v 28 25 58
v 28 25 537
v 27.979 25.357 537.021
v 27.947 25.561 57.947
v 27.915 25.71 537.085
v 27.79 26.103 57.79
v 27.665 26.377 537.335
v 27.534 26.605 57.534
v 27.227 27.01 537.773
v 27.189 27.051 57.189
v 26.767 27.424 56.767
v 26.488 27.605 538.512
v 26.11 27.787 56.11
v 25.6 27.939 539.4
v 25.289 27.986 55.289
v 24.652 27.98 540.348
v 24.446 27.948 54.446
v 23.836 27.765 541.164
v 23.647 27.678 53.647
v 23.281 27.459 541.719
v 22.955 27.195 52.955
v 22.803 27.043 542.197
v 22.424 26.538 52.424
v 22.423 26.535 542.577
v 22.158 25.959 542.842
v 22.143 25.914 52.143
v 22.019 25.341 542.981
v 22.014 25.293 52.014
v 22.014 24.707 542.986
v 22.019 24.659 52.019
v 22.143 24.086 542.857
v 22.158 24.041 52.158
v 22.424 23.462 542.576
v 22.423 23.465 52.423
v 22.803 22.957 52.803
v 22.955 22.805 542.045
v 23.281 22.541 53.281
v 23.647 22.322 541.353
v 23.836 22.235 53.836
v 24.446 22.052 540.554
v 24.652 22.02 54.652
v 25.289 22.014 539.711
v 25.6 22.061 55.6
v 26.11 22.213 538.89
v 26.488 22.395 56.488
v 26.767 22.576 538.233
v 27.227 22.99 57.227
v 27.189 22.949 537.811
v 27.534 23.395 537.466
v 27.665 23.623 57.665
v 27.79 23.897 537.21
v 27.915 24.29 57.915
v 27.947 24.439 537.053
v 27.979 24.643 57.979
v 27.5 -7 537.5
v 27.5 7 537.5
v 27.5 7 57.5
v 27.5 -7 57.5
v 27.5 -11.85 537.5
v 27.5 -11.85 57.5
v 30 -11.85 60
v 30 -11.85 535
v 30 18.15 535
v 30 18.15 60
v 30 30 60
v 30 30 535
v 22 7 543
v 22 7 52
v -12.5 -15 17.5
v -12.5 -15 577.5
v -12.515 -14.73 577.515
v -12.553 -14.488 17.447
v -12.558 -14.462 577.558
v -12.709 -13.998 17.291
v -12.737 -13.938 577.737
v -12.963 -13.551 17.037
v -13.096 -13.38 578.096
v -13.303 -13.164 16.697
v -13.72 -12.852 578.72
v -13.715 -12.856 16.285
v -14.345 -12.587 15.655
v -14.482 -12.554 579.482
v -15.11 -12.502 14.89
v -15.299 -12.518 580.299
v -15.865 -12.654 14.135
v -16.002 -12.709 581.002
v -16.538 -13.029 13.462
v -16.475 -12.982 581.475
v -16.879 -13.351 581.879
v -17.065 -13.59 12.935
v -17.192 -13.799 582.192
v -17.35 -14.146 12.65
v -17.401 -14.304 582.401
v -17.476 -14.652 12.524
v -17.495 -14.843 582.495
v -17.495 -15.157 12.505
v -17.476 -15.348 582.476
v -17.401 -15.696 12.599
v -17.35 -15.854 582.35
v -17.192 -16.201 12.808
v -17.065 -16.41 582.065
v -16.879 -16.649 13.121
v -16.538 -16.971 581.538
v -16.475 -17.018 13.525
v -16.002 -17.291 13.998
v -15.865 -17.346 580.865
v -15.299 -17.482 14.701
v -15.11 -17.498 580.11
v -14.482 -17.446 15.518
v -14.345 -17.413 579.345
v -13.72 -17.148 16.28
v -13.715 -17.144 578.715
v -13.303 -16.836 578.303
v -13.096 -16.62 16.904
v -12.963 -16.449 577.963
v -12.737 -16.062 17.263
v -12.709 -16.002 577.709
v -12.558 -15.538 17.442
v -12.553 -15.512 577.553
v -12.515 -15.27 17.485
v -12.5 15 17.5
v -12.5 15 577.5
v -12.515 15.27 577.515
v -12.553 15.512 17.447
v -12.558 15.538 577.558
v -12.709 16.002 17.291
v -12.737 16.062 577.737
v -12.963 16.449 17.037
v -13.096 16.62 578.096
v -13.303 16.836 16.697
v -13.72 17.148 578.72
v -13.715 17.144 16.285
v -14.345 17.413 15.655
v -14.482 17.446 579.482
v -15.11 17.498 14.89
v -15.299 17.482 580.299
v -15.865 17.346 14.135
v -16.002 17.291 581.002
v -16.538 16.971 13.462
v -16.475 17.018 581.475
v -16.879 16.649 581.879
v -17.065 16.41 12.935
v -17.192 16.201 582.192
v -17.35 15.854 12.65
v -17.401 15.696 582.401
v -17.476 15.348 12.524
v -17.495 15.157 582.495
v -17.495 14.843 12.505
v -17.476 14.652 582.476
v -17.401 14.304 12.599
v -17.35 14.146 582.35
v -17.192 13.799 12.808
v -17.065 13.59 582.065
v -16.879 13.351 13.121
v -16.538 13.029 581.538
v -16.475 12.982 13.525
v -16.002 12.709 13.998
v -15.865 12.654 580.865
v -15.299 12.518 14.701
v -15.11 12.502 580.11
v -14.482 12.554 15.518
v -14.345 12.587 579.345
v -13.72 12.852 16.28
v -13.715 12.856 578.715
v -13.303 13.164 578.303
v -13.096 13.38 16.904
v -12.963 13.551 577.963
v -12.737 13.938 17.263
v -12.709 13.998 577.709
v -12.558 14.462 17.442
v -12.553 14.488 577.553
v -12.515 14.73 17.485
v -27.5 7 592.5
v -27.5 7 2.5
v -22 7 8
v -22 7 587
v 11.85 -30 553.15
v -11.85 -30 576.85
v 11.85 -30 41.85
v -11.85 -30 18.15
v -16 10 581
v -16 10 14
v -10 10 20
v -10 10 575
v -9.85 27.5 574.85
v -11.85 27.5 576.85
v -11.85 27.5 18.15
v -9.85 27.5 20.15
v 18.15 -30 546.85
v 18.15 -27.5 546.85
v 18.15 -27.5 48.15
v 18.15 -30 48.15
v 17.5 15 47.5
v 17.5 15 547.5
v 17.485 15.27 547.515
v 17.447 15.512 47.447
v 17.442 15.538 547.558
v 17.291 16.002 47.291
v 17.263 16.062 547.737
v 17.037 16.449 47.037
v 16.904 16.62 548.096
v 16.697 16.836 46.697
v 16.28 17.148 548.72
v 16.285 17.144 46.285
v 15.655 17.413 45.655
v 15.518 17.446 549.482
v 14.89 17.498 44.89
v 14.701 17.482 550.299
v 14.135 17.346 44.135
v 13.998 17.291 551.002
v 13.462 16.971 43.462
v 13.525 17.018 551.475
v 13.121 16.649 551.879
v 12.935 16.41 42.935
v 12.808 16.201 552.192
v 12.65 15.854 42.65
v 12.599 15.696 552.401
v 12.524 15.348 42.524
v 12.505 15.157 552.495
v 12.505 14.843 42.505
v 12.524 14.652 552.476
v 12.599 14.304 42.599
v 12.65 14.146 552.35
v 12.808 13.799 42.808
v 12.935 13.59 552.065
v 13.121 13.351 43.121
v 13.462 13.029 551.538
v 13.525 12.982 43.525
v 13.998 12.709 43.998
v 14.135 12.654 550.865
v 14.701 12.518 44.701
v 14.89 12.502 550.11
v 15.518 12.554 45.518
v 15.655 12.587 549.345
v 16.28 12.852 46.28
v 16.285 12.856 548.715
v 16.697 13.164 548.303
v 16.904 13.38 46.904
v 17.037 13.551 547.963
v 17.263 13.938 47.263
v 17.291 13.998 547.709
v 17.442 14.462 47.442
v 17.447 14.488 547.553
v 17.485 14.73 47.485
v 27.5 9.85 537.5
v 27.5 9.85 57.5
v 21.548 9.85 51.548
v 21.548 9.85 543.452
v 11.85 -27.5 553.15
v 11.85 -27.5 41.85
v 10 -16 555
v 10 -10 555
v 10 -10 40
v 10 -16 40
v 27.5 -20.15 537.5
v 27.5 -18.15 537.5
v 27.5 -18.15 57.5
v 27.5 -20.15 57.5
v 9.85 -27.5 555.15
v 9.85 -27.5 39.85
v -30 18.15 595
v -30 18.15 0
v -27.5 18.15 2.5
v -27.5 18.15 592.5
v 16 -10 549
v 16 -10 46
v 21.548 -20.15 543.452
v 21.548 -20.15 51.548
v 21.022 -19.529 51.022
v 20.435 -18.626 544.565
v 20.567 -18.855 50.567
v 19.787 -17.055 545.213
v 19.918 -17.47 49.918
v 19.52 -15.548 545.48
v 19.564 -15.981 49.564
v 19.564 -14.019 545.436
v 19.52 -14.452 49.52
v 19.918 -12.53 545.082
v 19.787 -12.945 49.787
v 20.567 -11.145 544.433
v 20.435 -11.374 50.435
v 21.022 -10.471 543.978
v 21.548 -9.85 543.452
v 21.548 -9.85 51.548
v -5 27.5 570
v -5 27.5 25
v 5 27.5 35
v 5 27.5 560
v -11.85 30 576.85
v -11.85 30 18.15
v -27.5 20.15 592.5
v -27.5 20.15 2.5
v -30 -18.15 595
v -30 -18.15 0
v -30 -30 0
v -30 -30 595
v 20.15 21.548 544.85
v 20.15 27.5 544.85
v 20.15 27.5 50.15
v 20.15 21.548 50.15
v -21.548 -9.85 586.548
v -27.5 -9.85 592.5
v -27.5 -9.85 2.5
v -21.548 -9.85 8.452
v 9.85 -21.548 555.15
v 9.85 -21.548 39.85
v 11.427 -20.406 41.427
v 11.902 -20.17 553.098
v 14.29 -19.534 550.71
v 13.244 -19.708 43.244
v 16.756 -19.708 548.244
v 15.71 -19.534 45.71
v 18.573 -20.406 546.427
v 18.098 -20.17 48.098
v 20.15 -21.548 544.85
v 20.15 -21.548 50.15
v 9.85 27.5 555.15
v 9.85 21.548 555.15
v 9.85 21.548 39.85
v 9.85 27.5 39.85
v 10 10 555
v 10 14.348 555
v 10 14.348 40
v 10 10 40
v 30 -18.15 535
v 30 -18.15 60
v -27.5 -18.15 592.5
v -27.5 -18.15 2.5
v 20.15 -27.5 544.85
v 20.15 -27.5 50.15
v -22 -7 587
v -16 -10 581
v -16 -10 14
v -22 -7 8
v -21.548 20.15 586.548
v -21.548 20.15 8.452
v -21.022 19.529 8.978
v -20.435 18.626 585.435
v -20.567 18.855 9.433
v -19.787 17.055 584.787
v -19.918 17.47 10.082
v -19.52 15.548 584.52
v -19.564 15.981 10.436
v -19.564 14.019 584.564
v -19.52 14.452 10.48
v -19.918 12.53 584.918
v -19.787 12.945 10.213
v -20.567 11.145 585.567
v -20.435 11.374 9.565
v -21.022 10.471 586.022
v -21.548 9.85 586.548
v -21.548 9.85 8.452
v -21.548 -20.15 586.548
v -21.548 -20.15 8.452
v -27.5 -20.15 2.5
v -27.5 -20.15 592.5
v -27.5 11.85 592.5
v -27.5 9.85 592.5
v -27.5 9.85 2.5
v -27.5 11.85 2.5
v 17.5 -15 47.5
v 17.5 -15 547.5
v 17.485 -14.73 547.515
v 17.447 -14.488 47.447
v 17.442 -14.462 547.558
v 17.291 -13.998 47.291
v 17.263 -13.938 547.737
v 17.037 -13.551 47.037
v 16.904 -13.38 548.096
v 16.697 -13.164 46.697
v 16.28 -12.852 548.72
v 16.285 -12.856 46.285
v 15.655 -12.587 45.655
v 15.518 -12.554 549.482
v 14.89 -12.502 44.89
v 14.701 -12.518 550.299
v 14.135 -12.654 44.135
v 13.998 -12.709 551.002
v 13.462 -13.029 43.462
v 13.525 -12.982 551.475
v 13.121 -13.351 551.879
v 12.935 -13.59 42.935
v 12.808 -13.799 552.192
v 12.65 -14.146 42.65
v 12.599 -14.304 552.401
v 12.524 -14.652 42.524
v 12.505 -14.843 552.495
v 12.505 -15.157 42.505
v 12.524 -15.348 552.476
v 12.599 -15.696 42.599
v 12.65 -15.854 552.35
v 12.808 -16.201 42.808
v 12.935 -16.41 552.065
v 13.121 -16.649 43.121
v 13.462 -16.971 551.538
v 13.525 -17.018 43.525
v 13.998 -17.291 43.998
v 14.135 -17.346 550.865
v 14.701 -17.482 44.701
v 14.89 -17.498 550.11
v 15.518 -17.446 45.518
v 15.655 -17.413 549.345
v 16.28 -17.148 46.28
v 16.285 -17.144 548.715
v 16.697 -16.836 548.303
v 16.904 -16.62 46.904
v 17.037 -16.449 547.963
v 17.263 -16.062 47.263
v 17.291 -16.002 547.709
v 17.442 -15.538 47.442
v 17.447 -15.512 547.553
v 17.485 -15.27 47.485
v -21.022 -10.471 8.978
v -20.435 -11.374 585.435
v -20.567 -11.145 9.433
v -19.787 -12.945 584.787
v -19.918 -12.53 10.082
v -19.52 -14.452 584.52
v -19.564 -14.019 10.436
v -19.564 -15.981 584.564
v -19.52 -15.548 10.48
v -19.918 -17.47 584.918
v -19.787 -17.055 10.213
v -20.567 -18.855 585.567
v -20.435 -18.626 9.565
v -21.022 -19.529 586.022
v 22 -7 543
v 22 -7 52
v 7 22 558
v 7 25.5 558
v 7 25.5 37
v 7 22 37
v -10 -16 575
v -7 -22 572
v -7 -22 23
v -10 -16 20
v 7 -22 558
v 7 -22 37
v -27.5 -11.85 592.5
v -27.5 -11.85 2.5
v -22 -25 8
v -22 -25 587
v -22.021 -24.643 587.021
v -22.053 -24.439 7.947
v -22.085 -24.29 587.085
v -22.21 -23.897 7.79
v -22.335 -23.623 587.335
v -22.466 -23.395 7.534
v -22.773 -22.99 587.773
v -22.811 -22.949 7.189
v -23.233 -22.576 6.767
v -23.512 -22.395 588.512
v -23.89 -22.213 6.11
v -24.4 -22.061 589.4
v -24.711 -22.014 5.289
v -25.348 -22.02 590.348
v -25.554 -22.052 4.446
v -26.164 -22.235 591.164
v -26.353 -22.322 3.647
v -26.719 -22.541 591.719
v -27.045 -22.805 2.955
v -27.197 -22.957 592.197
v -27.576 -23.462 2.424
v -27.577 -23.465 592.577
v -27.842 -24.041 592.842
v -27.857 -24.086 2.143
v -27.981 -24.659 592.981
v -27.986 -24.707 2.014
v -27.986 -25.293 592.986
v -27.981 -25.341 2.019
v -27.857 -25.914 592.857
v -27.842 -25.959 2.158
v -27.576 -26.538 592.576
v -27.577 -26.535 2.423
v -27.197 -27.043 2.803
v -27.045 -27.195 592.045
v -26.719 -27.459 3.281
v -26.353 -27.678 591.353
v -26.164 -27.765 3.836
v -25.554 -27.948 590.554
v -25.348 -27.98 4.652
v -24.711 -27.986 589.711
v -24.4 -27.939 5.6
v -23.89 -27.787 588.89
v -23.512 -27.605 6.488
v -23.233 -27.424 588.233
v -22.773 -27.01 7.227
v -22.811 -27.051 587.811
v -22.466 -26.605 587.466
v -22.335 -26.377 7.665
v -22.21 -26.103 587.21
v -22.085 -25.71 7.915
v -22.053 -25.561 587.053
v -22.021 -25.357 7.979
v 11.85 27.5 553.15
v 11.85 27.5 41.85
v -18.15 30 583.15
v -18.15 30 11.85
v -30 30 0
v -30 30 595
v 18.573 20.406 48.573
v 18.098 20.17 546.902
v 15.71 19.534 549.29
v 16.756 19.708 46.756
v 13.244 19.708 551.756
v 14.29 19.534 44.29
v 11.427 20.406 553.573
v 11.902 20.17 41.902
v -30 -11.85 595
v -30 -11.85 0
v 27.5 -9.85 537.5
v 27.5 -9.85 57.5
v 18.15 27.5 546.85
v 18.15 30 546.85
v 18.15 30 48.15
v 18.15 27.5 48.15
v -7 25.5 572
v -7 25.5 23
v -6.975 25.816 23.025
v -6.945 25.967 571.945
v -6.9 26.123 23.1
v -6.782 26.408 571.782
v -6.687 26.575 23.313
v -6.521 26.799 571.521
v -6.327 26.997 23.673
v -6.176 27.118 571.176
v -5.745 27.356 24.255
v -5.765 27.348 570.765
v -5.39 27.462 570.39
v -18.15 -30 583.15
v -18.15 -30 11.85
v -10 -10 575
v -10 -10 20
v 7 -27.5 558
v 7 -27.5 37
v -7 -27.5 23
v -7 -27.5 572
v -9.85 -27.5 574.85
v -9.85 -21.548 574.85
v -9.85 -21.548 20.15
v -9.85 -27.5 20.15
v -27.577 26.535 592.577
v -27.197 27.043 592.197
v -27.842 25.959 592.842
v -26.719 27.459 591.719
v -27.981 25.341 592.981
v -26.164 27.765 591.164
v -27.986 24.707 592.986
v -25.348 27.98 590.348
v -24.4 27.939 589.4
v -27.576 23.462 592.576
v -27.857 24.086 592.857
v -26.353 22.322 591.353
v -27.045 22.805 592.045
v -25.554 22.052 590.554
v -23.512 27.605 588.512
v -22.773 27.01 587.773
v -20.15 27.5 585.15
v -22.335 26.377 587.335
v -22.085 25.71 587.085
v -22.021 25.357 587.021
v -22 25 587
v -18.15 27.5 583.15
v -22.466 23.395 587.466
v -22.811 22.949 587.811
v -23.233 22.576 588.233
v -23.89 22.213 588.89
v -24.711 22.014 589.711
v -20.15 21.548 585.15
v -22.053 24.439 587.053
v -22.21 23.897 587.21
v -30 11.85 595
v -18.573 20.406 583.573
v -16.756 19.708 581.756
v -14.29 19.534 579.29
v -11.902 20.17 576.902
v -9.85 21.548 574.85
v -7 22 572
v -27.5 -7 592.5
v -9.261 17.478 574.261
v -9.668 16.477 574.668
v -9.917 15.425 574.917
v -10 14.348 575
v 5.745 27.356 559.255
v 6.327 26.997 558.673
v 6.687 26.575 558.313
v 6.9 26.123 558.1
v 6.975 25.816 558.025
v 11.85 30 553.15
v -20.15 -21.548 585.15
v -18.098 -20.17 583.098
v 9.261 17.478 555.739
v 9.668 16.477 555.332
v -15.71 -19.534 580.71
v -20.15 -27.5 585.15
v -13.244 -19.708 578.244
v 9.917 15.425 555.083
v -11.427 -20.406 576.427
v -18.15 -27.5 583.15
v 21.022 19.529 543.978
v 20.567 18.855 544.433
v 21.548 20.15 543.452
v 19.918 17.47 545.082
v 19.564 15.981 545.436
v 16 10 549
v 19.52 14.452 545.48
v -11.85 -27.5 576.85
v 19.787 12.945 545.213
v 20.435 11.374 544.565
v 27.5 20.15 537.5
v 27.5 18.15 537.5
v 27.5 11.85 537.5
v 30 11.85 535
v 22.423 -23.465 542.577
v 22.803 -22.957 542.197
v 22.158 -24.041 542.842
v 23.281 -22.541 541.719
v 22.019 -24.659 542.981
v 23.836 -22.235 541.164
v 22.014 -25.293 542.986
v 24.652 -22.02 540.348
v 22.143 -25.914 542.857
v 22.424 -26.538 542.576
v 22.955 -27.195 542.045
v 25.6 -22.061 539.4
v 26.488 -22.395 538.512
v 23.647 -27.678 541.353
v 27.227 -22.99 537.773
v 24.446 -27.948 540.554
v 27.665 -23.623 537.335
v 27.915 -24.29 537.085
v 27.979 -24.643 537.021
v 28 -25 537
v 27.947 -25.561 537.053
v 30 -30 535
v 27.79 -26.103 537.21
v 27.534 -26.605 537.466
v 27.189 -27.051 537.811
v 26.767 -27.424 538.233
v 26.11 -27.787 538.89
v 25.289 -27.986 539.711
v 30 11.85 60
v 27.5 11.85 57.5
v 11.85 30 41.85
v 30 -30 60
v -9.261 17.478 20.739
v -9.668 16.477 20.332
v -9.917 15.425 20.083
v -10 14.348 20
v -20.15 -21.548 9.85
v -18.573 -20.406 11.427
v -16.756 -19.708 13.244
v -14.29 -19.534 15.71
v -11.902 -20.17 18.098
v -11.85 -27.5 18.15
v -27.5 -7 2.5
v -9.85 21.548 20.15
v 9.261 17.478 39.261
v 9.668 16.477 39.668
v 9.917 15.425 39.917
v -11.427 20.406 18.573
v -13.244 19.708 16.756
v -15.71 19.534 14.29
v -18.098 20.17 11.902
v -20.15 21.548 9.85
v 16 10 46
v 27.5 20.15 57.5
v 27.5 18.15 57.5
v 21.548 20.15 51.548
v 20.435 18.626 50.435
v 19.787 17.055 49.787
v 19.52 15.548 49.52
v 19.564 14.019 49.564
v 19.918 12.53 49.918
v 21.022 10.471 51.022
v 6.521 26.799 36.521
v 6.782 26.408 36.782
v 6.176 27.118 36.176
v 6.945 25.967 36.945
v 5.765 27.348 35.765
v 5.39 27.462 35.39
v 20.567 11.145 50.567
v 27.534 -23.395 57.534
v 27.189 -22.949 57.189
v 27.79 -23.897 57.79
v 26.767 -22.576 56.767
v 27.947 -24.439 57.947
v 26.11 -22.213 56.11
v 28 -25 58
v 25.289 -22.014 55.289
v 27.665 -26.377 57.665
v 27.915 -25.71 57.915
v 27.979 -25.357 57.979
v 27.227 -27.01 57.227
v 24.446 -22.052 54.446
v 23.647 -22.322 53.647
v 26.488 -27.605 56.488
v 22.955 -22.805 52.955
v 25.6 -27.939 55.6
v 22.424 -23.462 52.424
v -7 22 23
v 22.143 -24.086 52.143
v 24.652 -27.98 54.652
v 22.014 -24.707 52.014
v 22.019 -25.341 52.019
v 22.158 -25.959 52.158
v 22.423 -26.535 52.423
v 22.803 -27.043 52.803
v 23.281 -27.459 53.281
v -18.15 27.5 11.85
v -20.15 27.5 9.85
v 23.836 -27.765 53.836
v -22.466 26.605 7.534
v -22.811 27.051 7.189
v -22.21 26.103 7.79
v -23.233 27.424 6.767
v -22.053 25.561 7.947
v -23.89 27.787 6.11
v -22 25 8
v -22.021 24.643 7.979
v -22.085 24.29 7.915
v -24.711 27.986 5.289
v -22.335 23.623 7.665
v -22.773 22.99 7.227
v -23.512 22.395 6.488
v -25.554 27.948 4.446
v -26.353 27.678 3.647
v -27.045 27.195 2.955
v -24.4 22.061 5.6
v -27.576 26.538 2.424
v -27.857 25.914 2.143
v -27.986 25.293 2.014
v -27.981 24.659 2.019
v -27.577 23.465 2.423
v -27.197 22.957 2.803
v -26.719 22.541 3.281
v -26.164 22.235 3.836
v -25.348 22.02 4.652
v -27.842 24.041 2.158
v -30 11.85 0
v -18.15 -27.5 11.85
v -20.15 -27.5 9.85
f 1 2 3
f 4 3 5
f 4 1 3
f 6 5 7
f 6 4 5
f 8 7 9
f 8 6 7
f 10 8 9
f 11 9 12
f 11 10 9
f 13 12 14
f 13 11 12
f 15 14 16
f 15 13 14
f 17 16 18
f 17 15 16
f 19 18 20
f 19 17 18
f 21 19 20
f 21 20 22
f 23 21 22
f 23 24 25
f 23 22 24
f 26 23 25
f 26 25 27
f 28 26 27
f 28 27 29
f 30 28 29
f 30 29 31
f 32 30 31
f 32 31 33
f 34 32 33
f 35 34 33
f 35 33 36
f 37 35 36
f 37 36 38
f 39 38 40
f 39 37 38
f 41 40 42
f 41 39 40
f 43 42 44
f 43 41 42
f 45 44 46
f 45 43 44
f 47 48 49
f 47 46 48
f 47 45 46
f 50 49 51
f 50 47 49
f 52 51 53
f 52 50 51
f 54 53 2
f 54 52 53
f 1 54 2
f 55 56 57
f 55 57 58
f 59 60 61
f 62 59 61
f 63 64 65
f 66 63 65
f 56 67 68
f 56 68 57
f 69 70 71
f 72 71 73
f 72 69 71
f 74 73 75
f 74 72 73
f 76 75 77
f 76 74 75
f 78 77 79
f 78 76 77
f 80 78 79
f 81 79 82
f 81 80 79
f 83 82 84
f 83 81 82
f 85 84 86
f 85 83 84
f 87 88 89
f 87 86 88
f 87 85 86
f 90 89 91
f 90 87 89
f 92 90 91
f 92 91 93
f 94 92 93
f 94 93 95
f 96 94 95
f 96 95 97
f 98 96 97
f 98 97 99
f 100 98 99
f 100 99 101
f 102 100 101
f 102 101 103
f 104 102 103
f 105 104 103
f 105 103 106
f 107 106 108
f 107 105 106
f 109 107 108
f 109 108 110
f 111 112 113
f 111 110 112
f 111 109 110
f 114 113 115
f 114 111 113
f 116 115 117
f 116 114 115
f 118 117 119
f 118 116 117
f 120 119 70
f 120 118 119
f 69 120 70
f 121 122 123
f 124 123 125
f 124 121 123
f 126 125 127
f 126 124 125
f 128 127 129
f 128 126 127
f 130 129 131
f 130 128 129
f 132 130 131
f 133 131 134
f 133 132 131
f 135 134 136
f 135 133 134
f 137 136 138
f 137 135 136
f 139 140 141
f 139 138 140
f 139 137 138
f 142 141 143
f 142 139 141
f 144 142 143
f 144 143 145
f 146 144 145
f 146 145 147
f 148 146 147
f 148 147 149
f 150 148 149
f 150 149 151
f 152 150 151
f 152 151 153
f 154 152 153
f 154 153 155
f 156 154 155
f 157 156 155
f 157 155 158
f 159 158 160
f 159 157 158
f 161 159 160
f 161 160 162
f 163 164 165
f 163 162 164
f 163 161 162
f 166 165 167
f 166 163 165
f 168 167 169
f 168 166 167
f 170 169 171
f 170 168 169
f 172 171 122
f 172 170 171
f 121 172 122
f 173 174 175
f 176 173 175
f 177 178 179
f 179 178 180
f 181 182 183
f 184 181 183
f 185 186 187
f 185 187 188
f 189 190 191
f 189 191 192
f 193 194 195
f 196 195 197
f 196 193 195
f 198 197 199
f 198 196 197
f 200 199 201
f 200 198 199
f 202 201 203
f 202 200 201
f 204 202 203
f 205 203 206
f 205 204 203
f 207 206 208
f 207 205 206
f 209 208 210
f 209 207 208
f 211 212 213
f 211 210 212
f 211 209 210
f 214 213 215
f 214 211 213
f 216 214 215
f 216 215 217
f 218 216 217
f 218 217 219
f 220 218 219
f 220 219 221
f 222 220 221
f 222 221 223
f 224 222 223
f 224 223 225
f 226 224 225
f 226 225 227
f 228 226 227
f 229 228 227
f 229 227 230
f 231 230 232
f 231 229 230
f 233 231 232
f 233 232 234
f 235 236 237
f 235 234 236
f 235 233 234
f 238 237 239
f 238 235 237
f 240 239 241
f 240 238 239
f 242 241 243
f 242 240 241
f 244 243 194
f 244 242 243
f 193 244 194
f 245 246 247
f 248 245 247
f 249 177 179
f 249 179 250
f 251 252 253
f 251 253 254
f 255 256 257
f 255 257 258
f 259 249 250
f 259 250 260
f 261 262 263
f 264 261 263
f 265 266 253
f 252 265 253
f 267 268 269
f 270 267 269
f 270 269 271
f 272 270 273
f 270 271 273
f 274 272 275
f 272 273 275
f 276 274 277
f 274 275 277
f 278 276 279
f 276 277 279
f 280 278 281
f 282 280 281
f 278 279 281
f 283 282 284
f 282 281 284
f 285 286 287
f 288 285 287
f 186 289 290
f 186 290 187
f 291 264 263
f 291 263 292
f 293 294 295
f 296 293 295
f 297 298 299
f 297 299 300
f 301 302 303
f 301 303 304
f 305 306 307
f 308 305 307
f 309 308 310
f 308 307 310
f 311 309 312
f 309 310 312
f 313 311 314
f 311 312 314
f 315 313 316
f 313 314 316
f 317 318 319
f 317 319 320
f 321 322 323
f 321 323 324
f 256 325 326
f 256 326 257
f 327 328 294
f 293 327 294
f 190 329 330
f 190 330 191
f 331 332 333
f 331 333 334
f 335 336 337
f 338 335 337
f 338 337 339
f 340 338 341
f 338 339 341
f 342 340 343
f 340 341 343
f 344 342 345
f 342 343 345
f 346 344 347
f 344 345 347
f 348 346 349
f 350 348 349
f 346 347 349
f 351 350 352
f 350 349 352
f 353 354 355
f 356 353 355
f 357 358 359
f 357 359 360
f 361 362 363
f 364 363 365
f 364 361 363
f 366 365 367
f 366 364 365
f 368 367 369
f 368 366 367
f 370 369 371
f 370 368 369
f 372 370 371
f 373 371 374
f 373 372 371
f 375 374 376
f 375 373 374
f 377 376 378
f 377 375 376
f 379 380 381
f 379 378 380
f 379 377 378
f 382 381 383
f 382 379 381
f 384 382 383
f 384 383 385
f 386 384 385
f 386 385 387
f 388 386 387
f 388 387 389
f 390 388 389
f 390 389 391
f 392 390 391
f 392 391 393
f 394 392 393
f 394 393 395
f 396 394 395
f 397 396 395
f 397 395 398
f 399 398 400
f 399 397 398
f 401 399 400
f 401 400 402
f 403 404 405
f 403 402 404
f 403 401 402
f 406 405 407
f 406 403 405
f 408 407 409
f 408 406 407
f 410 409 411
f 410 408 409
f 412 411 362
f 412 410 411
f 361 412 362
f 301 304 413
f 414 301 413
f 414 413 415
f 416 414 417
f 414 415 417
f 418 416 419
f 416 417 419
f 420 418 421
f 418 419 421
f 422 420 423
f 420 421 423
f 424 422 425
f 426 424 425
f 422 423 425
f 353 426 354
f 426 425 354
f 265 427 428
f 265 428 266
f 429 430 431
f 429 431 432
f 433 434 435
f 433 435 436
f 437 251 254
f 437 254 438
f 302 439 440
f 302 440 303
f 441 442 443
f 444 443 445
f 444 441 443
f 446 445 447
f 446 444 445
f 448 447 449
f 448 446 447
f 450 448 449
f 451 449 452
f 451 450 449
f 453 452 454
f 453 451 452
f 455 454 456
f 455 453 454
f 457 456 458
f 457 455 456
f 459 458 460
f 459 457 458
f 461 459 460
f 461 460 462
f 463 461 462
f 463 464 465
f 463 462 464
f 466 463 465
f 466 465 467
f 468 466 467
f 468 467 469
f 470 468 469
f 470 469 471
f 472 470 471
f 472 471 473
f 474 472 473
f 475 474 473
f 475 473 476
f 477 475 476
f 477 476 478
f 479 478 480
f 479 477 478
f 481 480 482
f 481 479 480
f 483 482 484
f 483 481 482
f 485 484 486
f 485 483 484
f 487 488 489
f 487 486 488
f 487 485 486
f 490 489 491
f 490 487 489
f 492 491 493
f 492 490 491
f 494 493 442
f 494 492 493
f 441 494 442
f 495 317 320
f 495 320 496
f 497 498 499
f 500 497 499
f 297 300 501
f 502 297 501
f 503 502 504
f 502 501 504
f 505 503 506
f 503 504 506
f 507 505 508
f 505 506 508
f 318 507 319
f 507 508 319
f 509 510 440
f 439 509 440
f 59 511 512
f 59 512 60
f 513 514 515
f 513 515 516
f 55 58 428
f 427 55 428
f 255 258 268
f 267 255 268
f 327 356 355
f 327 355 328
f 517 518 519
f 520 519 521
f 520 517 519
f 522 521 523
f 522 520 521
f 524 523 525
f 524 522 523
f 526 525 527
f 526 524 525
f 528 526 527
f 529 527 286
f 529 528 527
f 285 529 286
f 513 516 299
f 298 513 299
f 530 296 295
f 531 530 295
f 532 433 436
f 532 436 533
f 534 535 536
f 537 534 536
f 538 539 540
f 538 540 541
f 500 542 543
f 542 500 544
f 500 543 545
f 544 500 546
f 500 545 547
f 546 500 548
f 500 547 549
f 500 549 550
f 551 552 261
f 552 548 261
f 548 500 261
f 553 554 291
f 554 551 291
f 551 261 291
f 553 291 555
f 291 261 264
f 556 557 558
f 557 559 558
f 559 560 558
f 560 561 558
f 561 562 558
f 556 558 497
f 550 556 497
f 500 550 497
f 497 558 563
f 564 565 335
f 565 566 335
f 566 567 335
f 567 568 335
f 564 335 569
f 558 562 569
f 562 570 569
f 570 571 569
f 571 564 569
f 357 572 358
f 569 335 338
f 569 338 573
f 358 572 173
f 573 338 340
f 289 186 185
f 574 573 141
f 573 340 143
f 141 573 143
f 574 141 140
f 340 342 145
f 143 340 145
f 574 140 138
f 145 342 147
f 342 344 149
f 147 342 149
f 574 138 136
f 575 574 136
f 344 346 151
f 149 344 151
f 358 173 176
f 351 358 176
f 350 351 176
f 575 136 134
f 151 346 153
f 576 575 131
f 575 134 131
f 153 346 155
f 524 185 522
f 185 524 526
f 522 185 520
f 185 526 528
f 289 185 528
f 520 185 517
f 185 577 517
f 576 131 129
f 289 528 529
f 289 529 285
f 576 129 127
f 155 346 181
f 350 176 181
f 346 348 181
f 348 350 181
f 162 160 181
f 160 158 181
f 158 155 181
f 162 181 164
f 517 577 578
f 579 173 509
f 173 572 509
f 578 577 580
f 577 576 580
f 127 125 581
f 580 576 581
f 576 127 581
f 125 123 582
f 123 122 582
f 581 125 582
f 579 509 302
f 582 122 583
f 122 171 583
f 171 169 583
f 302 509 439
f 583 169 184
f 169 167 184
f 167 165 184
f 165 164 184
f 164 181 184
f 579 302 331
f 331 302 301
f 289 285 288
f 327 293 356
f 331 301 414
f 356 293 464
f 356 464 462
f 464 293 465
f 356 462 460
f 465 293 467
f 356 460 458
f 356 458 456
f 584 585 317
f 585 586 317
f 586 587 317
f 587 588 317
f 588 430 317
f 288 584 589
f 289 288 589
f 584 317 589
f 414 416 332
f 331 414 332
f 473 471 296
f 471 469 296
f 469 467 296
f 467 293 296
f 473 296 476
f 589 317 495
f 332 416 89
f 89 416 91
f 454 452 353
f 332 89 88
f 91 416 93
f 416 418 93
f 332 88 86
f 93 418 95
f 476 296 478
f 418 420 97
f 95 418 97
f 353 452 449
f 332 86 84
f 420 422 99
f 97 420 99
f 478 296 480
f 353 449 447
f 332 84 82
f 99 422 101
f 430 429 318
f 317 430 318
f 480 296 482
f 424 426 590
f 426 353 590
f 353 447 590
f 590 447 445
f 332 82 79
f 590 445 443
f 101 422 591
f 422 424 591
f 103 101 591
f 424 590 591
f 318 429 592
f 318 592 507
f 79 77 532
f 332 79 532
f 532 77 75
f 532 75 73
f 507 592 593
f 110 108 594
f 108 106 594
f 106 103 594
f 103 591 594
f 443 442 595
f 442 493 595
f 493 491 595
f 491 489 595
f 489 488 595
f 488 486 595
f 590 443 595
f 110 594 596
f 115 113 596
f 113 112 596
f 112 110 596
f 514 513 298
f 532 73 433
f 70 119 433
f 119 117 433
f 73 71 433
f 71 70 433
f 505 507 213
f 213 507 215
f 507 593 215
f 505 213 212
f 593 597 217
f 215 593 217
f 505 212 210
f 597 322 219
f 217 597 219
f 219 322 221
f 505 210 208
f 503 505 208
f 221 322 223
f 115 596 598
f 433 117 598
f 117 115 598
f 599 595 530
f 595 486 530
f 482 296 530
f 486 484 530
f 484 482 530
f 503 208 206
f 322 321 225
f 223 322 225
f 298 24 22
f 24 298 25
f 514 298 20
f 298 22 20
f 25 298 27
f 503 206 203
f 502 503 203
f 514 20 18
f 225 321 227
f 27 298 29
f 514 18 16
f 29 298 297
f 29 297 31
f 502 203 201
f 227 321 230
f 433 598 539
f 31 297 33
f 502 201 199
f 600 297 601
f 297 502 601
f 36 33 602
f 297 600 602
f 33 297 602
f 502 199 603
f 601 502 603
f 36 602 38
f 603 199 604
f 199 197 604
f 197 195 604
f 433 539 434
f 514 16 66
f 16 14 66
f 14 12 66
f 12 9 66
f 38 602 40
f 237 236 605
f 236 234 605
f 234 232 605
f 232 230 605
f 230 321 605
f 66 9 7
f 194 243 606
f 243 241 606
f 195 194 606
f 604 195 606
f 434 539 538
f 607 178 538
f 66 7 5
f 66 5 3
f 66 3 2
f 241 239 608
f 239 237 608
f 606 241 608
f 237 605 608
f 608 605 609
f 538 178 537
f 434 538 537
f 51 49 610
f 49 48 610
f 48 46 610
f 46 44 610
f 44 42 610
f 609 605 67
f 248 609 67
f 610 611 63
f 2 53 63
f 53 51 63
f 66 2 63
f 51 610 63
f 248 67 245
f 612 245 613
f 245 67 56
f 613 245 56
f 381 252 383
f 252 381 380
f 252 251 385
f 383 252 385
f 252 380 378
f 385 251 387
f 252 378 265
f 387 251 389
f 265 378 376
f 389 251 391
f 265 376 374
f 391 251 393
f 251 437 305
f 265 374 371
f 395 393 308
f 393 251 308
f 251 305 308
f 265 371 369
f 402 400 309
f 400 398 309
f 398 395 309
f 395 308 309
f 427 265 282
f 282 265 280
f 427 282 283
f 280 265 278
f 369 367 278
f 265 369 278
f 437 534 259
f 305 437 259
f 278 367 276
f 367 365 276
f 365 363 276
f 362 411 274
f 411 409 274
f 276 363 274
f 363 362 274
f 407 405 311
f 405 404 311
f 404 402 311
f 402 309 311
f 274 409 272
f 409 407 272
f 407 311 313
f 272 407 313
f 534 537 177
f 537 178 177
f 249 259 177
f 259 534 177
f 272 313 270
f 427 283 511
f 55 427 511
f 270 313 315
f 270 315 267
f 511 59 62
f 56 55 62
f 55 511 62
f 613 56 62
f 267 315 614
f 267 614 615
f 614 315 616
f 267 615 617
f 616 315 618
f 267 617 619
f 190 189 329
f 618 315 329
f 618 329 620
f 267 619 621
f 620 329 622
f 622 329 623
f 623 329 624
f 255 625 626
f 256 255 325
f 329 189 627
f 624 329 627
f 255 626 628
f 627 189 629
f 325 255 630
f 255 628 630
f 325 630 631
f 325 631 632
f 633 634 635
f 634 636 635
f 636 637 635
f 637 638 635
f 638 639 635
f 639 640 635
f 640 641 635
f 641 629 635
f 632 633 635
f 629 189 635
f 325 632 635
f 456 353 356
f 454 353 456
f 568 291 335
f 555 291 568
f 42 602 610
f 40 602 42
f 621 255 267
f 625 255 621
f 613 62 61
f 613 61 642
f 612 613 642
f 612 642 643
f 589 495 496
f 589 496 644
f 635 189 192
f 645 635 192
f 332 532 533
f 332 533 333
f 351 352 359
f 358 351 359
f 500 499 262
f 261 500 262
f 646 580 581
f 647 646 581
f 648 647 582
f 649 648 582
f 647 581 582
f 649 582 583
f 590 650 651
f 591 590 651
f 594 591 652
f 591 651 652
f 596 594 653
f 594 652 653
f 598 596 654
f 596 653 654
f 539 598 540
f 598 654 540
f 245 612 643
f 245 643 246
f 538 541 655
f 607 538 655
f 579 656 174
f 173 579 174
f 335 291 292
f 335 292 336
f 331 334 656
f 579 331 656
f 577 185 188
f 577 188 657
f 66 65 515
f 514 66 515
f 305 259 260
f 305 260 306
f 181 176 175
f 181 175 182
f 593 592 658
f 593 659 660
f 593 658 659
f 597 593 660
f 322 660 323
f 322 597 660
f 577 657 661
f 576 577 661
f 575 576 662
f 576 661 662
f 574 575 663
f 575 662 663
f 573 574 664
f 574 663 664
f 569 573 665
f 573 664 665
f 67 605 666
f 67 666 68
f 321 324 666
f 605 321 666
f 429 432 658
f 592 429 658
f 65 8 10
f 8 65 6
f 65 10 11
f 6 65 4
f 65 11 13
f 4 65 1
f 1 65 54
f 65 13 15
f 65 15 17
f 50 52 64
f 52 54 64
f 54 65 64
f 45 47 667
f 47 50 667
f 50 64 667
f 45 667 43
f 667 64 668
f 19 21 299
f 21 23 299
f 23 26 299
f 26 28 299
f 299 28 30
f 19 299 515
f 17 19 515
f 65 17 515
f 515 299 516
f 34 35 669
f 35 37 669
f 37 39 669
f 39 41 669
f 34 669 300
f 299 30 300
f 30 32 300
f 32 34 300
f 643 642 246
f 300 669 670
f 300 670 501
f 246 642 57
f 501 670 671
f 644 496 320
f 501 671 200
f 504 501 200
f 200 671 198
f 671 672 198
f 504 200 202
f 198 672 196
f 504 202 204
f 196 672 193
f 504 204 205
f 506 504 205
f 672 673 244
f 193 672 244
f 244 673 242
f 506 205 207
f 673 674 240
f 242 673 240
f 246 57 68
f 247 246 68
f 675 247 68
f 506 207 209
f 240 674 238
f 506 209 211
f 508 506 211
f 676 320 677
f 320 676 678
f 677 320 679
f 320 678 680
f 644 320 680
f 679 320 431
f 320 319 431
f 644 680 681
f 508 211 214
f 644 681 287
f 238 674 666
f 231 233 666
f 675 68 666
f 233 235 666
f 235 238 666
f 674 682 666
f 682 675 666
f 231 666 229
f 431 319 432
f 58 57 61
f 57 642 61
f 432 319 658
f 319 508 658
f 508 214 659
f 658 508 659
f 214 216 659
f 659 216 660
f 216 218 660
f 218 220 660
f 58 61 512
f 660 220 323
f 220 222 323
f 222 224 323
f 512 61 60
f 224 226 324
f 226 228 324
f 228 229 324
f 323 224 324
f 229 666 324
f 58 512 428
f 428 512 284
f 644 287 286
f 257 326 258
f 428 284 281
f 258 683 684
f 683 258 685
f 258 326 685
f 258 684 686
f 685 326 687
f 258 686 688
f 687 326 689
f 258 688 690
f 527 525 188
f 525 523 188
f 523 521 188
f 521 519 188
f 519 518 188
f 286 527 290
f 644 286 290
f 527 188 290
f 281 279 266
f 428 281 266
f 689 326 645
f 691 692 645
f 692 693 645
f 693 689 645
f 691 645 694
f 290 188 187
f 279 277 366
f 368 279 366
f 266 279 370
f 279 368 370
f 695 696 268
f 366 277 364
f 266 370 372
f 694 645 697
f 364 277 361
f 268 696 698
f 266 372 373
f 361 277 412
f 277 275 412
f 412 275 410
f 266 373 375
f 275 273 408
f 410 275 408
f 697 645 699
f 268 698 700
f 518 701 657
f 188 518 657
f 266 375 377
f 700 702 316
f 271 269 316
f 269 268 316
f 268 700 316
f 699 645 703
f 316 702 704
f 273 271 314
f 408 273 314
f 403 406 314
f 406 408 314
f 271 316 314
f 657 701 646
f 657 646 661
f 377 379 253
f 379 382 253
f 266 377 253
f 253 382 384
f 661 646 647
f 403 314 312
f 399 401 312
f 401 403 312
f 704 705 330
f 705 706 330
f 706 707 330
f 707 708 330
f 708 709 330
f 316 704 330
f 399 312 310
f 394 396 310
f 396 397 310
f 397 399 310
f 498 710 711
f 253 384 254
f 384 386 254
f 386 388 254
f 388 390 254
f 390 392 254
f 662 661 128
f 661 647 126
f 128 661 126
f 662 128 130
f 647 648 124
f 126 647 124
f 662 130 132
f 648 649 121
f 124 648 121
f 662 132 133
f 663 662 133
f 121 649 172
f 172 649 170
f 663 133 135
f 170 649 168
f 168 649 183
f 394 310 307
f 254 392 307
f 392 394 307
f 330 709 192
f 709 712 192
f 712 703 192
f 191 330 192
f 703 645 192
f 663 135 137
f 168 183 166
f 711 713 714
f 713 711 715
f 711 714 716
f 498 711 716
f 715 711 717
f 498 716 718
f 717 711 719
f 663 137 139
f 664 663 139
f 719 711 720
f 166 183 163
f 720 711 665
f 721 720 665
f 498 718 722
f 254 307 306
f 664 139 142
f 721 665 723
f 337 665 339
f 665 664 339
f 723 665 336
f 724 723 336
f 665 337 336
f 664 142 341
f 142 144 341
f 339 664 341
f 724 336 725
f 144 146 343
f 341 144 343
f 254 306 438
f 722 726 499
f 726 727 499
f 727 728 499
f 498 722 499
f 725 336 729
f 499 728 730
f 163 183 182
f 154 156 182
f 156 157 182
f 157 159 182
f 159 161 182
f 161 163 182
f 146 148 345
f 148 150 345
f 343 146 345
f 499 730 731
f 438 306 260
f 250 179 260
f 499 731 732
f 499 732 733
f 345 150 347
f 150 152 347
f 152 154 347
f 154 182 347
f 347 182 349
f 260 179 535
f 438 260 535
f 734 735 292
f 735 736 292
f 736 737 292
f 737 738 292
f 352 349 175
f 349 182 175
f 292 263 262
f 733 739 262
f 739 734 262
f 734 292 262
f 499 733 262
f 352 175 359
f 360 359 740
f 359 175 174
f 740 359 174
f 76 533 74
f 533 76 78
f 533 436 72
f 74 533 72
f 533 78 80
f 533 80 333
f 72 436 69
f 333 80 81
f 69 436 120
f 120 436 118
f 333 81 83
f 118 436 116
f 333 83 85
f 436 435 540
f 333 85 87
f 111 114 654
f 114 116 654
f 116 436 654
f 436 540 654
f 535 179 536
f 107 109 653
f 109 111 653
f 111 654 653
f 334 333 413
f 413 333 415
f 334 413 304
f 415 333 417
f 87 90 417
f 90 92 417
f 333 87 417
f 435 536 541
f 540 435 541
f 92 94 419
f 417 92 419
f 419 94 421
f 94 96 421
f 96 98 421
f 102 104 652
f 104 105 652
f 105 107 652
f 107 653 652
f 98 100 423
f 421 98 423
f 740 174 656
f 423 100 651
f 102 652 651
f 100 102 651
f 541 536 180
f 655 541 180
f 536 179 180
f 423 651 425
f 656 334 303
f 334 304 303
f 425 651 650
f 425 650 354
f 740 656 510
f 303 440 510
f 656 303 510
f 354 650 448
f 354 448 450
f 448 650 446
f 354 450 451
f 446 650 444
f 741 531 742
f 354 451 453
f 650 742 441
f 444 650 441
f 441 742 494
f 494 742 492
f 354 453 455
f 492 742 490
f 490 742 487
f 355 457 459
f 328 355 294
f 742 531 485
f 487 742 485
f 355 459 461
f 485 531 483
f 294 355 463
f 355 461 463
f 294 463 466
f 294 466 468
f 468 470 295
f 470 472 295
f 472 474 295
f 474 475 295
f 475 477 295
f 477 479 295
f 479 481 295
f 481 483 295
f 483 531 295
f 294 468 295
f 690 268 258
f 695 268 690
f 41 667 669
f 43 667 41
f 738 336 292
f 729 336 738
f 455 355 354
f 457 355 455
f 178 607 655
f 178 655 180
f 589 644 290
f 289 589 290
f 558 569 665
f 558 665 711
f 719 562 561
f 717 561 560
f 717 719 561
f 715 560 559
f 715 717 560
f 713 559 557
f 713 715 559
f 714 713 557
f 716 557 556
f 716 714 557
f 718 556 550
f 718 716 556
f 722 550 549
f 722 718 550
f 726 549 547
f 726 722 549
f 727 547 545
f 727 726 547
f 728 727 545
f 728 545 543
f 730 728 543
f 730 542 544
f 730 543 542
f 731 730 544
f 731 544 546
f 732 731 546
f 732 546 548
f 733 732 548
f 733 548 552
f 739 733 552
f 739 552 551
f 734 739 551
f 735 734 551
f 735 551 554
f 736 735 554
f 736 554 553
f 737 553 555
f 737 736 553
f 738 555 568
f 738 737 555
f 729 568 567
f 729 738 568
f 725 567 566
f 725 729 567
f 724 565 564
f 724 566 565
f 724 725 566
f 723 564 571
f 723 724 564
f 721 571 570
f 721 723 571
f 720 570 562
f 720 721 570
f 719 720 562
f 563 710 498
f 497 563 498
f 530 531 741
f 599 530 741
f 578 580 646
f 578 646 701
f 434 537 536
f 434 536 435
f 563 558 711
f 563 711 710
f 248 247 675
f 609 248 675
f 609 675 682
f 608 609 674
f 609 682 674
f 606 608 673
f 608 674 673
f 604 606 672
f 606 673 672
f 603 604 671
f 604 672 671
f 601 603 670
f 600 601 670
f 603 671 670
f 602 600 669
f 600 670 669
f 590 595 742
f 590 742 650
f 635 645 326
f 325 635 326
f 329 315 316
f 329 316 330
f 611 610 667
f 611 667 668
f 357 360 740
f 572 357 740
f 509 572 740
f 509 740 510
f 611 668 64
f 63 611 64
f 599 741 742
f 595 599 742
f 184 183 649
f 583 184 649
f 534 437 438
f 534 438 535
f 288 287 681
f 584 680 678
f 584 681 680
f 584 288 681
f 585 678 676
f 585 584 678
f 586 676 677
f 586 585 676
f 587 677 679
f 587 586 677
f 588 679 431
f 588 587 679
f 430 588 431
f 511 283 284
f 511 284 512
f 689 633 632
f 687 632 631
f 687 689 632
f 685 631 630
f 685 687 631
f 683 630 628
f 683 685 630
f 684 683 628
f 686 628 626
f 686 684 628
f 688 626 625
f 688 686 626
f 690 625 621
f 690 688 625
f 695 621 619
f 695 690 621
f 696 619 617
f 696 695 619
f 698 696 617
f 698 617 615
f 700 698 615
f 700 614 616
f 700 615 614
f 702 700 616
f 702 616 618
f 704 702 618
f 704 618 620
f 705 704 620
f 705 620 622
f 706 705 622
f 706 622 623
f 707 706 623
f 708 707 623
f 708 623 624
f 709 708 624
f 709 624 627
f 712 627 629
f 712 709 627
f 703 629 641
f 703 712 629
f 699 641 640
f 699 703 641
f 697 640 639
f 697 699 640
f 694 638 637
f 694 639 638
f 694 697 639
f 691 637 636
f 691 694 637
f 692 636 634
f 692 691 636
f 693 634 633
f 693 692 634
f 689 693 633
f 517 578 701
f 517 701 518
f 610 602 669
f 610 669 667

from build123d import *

# Parameters (mm, degrees)
F0_R     = 3
F0_R_2   = 2.5
F1_DEPTH = 595
F2_R     = 2
F3_R     = 7
F5_DEPTH = 60


# Not quite as in the source:
# - a feature names something its author has since deleted; it is built from what else it names


with BuildPart() as f1:
    # F0 (on Top) → F1 (new body)
    with BuildSketch(Plane.XY):
        with BuildLine():
            Line((18.15, -30), (30, -30))
            Line((30, -30), (30, -18.15))
            Line((30, -18.15), (27.5, -18.15))
            Line((27.5, -18.15), (27.5, -20.15))
            Line((27.5, -20.15), (21.5477069044, -20.15))
            ThreePointArc((21.5477069044, -20.15), (19.5, -15), (21.5477069044, -9.85))
            Line((21.5477069044, -9.85), (27.5, -9.85))
            Line((27.5, -9.85), (27.5, -11.85))
            Line((27.5, -11.85), (30, -11.85))
            Line((30, -11.85), (30, 11.85))
            Line((30, 11.85), (27.5, 11.85))
            Line((27.5, 11.85), (27.5, 9.85))
            Line((27.5, 9.85), (21.5477069044, 9.85))
            ThreePointArc((21.5477069044, 9.85), (19.5, 15), (21.5477069044, 20.15))
            Line((21.5477069044, 20.15), (27.5, 20.15))
            Line((27.5, 20.15), (27.5, 18.15))
            Line((27.5, 18.15), (30, 18.15))
            Line((30, 18.15), (30, 30))
            Line((30, 30), (18.15, 30))
            Line((18.15, 30), (18.15, 27.5))
            Line((18.15, 27.5), (20.15, 27.5))
            Line((20.15, 27.5), (20.15, 21.5477069044))
            ThreePointArc((20.15, 21.5477069044), (15, 19.5), (9.85, 21.5477069044))
            Line((9.85, 21.5477069044), (9.85, 27.5))
            Line((9.85, 27.5), (11.85, 27.5))
            Line((11.85, 27.5), (11.85, 30))
            Line((11.85, 30), (-11.85, 30))
            Line((-11.85, 30), (-11.85, 27.5))
            Line((-11.85, 27.5), (-9.85, 27.5))
            Line((-9.85, 27.5), (-9.85, 21.5477069044))
            ThreePointArc((-9.85, 21.5477069044), (-15, 19.5), (-20.15, 21.5477069044))
            Line((-20.15, 21.5477069044), (-20.15, 27.5))
            Line((-20.15, 27.5), (-18.15, 27.5))
            Line((-18.15, 27.5), (-18.15, 30))
            Line((-18.15, 30), (-30, 30))
            Line((-30, 30), (-30, 18.15))
            Line((-30, 18.15), (-27.5, 18.15))
            Line((-27.5, 18.15), (-27.5, 20.15))
            Line((-27.5, 20.15), (-21.5477069044, 20.15))
            ThreePointArc((-21.5477069044, 20.15), (-19.5, 15), (-21.5477069044, 9.85))
            Line((-21.5477069044, 9.85), (-27.5, 9.85))
            Line((-27.5, 9.85), (-27.5, 11.85))
            Line((-27.5, 11.85), (-30, 11.85))
            Line((-30, 11.85), (-30, -11.85))
            Line((-30, -11.85), (-27.5, -11.85))
            Line((-27.5, -11.85), (-27.5, -9.85))
            Line((-27.5, -9.85), (-21.5477069044, -9.85))
            ThreePointArc((-21.5477069044, -9.85), (-19.5, -15), (-21.5477069044, -20.15))
            Line((-21.5477069044, -20.15), (-27.5, -20.15))
            Line((-27.5, -20.15), (-27.5, -18.15))
            Line((-27.5, -18.15), (-30, -18.15))
            Line((-30, -18.15), (-30, -30))
            Line((-30, -30), (-18.15, -30))
            Line((-18.15, -30), (-18.15, -27.5))
            Line((-18.15, -27.5), (-20.15, -27.5))
            Line((-20.15, -27.5), (-20.15, -21.5477069044))
            ThreePointArc((-20.15, -21.5477069044), (-15, -19.5), (-9.85, -21.5477069044))
            Line((-9.85, -21.5477069044), (-9.85, -27.5))
            Line((-9.85, -27.5), (-11.85, -27.5))
            Line((-11.85, -27.5), (-11.85, -30))
            Line((-11.85, -30), (11.85, -30))
            Line((11.85, -30), (11.85, -27.5))
            Line((11.85, -27.5), (9.85, -27.5))
            Line((9.85, -27.5), (9.85, -21.5477069044))
            ThreePointArc((9.85, -21.5477069044), (15, -19.5), (20.15, -21.5477069044))
            Line((20.15, -21.5477069044), (20.15, -27.5))
            Line((20.15, -27.5), (18.15, -27.5))
            Line((18.15, -27.5), (18.15, -30))
        make_face()
        with Locations((-25, -25)):
            Circle(F0_R, mode=Mode.SUBTRACT)
        with Locations((-15, -15)):
            Circle(F0_R_2, mode=Mode.SUBTRACT)
        with Locations((25, -25)):
            Circle(F0_R, mode=Mode.SUBTRACT)
        with Locations((15, -15)):
            Circle(F0_R_2, mode=Mode.SUBTRACT)
        with Locations((-25, 25)):
            Circle(F0_R, mode=Mode.SUBTRACT)
        with Locations((-15, 15)):
            Circle(F0_R_2, mode=Mode.SUBTRACT)
        Polygon((-7, 22), (-7, 27.5), (0, 27.5), (7, 27.5), (7, 22), (10, 16), (10, 10), (16, 10), (22, 7), (27.5, 7), (27.5, 0), (27.5, -7), (22, -7), (16, -10), (10, -10), (10, -16), (7, -22), (7, -27.5), (0, -27.5), (-7, -27.5), (-7, -22), (-10, -16), (-10, -10), (-16, -10), (-22, -7), (-27.5, -7), (-27.5, 0), (-27.5, 7), (-22, 7), (-16, 10), (-10, 10), (-10, 16), align=None, mode=Mode.SUBTRACT)
        with Locations((15, 15)):
            Circle(F0_R_2, mode=Mode.SUBTRACT)
        with Locations((25, 25)):
            Circle(F0_R, mode=Mode.SUBTRACT)
    extrude(amount=F1_DEPTH)

    # F2
    f2_edges = [f1.edges().sort_by_distance(p)[0] for p in [
        (-7, 27.5, 297.5),
        (7, 27.5, 297.5),
    ]]
    fillet(f2_edges, radius=F2_R)

    # F3
    f3_edges = [f1.edges().sort_by_distance(p)[0] for p in [
        (-10, 16, 297.5),
        (10, 16, 297.5),
    ]]
    fillet(f3_edges, radius=F3_R)

    # F4 (on face) → F5 (cut)
    with BuildSketch(Plane.XZ.offset(30)):
        Polygon((30, 0), (30, 60), (-30, 0), (-18.15, 0), align=None)
        Polygon((30, 535), (30, 595), (-18.15, 595), (-30, 595), align=None)
    extrude(amount=-F5_DEPTH, mode=Mode.SUBTRACT)


solid = f1.part
